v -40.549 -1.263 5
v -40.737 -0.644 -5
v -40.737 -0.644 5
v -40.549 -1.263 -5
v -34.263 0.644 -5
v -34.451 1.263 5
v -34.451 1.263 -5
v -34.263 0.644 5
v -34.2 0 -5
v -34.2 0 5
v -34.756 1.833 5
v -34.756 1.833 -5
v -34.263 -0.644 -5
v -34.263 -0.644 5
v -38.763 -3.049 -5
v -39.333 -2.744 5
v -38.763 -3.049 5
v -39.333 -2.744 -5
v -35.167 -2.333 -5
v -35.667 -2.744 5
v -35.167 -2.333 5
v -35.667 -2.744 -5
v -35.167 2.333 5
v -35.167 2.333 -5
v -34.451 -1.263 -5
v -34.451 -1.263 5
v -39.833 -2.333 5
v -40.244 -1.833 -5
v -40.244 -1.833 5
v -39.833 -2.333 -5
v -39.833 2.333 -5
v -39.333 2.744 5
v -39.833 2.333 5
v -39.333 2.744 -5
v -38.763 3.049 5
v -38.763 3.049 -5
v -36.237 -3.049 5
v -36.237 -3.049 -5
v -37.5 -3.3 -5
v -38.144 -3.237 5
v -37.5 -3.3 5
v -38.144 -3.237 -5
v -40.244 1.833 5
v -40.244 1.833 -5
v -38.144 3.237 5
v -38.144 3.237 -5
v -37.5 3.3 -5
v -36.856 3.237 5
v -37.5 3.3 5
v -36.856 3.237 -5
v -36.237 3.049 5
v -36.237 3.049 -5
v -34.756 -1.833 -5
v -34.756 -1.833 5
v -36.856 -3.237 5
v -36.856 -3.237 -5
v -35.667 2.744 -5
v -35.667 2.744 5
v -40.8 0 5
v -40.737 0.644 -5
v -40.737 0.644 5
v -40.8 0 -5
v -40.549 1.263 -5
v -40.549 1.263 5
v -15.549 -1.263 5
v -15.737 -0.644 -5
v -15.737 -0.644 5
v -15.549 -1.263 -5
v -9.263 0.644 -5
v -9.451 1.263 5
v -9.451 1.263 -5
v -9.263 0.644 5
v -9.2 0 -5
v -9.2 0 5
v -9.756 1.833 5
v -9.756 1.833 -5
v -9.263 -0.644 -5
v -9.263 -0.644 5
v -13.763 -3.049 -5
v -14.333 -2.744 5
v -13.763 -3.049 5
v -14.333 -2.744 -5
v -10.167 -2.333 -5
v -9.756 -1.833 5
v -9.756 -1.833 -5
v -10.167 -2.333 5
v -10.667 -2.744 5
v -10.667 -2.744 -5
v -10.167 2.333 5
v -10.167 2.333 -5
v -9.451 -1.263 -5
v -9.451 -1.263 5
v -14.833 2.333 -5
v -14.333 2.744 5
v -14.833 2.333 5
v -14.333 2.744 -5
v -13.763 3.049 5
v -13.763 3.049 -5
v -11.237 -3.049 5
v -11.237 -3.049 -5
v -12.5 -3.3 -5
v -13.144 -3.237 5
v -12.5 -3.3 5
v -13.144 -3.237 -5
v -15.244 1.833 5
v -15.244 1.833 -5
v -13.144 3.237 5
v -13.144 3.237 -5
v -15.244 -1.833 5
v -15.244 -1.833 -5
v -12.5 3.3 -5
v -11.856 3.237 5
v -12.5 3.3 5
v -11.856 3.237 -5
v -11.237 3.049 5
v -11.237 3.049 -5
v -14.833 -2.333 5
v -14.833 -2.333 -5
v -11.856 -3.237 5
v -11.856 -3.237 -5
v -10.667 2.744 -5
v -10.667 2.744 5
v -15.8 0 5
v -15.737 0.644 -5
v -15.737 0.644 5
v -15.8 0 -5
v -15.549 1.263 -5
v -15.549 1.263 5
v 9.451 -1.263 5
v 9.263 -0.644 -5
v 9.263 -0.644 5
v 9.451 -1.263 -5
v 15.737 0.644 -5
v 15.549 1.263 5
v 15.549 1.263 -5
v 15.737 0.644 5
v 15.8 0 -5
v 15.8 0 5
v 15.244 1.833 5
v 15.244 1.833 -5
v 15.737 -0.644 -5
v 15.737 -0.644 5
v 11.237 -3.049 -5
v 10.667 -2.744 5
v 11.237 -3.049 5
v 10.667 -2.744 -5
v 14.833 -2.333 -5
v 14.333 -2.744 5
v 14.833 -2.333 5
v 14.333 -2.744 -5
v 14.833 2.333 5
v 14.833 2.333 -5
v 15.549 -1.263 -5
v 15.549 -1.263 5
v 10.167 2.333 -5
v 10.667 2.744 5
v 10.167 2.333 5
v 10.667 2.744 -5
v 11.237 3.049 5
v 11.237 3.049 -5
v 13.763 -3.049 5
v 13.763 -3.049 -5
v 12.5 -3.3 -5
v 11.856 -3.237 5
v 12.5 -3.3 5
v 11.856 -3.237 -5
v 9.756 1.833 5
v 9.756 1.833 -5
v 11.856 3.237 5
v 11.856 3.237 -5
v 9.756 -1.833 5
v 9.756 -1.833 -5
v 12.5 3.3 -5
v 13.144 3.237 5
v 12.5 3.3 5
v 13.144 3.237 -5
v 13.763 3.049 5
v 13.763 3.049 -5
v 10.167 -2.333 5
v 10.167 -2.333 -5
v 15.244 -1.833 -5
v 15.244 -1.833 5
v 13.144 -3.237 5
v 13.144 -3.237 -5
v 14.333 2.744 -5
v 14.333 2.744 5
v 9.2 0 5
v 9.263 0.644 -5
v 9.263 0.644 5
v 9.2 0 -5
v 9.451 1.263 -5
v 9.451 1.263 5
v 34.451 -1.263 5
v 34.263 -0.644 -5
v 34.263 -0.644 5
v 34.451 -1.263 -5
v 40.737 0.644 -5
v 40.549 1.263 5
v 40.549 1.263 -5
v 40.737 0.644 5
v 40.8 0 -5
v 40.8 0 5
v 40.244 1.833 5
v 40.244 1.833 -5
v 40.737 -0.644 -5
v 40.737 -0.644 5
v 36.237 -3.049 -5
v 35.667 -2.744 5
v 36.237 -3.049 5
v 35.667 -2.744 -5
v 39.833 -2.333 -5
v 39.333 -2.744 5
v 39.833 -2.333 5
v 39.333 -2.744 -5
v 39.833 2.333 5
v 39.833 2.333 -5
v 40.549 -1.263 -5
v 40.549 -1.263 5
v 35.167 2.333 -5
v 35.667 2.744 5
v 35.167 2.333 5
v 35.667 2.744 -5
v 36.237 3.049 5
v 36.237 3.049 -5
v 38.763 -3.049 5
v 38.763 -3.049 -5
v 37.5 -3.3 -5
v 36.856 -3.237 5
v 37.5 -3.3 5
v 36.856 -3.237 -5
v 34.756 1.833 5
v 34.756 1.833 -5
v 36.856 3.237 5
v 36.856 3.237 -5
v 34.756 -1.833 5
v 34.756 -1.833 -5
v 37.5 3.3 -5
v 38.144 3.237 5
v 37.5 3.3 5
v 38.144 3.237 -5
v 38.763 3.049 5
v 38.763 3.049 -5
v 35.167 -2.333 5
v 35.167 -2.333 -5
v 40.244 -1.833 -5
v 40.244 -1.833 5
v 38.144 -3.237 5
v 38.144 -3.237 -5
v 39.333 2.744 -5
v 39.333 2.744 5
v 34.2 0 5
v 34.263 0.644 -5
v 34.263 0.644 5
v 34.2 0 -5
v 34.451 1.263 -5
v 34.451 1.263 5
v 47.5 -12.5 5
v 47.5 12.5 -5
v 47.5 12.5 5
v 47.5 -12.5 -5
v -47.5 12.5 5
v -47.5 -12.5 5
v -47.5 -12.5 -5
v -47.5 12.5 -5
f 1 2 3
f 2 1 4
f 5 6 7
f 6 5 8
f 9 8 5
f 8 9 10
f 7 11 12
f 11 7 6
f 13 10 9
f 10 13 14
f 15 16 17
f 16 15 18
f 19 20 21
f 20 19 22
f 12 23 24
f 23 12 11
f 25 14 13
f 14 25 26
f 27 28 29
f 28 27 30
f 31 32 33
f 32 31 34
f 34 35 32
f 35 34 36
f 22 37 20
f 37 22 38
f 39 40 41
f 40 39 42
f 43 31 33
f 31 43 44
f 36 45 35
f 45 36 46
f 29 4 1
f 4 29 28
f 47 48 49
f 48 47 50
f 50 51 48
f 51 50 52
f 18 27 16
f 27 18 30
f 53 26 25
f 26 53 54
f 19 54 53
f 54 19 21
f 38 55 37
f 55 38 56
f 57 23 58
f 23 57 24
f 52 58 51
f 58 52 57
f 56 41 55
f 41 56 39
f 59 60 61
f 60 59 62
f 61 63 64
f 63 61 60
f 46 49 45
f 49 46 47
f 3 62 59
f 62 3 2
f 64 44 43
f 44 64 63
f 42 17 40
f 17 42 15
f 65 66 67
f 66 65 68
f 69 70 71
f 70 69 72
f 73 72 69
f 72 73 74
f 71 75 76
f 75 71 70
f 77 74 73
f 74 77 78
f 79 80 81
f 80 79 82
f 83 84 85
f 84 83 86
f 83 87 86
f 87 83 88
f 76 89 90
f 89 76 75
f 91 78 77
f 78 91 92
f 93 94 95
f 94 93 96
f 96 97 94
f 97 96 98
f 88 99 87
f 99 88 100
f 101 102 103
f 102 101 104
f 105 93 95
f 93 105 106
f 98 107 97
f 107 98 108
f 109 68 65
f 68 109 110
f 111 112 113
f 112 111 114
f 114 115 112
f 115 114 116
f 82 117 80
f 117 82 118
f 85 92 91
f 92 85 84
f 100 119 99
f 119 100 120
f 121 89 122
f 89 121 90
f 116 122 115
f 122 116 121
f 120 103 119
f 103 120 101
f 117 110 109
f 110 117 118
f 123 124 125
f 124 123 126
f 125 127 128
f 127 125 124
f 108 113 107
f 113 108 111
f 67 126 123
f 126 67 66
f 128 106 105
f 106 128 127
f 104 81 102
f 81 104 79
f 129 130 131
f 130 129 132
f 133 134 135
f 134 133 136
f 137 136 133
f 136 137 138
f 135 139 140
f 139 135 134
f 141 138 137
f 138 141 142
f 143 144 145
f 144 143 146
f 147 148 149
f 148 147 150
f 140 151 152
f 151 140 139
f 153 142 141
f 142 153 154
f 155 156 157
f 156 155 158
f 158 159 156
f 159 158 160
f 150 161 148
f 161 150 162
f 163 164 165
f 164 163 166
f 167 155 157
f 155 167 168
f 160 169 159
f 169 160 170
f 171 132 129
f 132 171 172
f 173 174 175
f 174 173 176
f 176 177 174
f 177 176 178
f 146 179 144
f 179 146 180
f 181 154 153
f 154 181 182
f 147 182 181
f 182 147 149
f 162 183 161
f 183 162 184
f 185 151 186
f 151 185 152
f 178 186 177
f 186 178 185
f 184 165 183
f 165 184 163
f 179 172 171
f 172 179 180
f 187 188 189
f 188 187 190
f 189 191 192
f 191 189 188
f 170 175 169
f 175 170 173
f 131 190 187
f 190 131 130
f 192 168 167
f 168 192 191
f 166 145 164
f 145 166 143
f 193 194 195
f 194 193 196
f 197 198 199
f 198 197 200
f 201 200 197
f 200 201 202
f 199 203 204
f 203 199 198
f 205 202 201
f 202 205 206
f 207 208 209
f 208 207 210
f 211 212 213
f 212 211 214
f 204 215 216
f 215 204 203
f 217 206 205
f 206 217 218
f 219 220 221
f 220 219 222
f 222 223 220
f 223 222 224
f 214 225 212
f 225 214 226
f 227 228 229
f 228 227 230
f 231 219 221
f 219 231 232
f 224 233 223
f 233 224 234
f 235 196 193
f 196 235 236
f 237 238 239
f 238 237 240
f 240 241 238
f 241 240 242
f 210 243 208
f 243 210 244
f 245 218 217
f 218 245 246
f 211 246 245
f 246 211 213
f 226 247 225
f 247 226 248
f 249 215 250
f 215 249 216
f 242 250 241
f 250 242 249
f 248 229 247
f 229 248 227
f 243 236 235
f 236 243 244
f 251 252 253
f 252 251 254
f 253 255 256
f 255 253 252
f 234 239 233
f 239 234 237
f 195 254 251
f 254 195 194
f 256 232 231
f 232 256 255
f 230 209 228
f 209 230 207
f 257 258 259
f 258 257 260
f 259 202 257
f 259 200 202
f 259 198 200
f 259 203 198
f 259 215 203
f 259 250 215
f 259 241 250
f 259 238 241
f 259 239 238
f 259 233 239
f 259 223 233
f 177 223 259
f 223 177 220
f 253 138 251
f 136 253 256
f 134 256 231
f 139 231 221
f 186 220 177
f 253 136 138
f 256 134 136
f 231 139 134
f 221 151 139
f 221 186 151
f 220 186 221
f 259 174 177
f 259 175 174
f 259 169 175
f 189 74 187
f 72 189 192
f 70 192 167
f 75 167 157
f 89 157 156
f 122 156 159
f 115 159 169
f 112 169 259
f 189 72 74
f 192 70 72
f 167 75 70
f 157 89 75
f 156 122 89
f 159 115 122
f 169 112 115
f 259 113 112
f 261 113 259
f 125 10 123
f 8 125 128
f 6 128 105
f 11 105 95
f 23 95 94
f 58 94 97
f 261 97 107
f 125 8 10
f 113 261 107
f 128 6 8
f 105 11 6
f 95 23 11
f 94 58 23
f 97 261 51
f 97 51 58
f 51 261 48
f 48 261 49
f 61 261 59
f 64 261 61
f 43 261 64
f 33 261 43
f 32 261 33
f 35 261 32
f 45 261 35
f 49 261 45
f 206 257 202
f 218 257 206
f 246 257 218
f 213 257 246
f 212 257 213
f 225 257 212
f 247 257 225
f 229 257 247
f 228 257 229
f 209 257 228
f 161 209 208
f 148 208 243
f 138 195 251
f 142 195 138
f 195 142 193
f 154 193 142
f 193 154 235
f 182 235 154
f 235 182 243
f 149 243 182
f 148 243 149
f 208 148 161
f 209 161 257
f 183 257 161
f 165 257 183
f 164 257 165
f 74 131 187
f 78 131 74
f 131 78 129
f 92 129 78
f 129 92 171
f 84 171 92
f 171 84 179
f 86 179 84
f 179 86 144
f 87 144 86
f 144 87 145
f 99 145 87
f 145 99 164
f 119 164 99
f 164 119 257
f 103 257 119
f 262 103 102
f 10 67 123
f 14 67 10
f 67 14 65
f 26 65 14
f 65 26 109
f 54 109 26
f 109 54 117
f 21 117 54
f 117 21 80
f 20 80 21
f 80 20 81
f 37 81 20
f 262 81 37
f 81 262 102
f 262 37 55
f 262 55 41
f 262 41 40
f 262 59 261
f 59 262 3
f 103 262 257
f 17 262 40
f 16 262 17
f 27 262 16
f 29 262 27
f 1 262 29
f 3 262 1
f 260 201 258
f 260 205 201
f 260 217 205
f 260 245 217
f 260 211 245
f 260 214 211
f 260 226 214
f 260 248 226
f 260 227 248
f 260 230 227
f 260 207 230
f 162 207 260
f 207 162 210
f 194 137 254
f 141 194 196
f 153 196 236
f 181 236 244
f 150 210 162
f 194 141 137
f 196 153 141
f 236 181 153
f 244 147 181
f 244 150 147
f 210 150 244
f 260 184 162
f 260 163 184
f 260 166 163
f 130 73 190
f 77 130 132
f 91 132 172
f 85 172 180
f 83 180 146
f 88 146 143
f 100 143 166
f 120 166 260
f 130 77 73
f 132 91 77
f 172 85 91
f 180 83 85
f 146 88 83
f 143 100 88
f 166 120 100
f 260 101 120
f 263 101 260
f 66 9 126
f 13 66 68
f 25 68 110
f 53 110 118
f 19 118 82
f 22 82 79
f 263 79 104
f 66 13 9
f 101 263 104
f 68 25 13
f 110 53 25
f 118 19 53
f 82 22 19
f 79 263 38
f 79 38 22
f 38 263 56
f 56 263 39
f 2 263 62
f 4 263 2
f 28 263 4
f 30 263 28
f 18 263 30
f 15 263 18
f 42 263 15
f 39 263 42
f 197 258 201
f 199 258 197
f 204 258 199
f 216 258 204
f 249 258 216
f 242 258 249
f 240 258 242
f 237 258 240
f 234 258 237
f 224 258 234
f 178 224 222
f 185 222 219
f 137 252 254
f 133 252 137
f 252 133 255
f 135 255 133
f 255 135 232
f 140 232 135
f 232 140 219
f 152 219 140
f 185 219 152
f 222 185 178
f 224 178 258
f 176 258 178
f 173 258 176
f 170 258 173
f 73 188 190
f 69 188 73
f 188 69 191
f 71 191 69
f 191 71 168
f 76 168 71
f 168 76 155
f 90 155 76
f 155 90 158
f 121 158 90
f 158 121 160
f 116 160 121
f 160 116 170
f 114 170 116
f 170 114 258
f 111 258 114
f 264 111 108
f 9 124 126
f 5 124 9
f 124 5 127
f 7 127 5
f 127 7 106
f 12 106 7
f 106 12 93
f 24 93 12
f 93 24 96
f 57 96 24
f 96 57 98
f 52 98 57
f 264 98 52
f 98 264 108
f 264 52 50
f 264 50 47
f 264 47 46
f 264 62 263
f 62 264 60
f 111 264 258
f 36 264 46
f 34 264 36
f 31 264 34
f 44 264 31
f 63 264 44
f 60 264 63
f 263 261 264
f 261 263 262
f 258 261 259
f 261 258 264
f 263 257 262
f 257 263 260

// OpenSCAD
$fn = 32;

// ----------------------------------------------------------------------
// Hole bar, 4 x Ø6.6
// row layout, 10 mm edge offset
// ----------------------------------------------------------------------

// --- parameters (mm) ---
bar_w = 25;    // bar width (Y)
bar_t = 10;    // bar thickness (Z)
holes = 4;     // holes per row
hole_d = 6.6;  // hole diameter
edge = 10;     // offset from the bar end to the first hole
pitch = 25;    // pitch between neighbouring holes

// --- derived feature positions (mm) ---
span = (holes - 1) * pitch;   // = 75   distance between the end holes
bar_l = span + 2 * edge;      // = 95   overall bar length
start_x = -bar_l / 2 + edge;  // = -37.5   X of the first hole
feature_centers = [
  [start_x + 0 * pitch, 0],
  [start_x + 1 * pitch, 0],
  [start_x + 2 * pitch, 0],
  [start_x + 3 * pitch, 0]
];   // hole centres of the first row

// bar with one row of holes, drilled from feature_centers
difference() {
  translate([-bar_l / 2, -bar_w / 2, -bar_t / 2]) cube([bar_l, bar_w, bar_t]);
  for (centre = feature_centers)
    translate([centre[0], centre[1], 0])
      cylinder(d = hole_d, h = bar_t + 2, center = true);
}
